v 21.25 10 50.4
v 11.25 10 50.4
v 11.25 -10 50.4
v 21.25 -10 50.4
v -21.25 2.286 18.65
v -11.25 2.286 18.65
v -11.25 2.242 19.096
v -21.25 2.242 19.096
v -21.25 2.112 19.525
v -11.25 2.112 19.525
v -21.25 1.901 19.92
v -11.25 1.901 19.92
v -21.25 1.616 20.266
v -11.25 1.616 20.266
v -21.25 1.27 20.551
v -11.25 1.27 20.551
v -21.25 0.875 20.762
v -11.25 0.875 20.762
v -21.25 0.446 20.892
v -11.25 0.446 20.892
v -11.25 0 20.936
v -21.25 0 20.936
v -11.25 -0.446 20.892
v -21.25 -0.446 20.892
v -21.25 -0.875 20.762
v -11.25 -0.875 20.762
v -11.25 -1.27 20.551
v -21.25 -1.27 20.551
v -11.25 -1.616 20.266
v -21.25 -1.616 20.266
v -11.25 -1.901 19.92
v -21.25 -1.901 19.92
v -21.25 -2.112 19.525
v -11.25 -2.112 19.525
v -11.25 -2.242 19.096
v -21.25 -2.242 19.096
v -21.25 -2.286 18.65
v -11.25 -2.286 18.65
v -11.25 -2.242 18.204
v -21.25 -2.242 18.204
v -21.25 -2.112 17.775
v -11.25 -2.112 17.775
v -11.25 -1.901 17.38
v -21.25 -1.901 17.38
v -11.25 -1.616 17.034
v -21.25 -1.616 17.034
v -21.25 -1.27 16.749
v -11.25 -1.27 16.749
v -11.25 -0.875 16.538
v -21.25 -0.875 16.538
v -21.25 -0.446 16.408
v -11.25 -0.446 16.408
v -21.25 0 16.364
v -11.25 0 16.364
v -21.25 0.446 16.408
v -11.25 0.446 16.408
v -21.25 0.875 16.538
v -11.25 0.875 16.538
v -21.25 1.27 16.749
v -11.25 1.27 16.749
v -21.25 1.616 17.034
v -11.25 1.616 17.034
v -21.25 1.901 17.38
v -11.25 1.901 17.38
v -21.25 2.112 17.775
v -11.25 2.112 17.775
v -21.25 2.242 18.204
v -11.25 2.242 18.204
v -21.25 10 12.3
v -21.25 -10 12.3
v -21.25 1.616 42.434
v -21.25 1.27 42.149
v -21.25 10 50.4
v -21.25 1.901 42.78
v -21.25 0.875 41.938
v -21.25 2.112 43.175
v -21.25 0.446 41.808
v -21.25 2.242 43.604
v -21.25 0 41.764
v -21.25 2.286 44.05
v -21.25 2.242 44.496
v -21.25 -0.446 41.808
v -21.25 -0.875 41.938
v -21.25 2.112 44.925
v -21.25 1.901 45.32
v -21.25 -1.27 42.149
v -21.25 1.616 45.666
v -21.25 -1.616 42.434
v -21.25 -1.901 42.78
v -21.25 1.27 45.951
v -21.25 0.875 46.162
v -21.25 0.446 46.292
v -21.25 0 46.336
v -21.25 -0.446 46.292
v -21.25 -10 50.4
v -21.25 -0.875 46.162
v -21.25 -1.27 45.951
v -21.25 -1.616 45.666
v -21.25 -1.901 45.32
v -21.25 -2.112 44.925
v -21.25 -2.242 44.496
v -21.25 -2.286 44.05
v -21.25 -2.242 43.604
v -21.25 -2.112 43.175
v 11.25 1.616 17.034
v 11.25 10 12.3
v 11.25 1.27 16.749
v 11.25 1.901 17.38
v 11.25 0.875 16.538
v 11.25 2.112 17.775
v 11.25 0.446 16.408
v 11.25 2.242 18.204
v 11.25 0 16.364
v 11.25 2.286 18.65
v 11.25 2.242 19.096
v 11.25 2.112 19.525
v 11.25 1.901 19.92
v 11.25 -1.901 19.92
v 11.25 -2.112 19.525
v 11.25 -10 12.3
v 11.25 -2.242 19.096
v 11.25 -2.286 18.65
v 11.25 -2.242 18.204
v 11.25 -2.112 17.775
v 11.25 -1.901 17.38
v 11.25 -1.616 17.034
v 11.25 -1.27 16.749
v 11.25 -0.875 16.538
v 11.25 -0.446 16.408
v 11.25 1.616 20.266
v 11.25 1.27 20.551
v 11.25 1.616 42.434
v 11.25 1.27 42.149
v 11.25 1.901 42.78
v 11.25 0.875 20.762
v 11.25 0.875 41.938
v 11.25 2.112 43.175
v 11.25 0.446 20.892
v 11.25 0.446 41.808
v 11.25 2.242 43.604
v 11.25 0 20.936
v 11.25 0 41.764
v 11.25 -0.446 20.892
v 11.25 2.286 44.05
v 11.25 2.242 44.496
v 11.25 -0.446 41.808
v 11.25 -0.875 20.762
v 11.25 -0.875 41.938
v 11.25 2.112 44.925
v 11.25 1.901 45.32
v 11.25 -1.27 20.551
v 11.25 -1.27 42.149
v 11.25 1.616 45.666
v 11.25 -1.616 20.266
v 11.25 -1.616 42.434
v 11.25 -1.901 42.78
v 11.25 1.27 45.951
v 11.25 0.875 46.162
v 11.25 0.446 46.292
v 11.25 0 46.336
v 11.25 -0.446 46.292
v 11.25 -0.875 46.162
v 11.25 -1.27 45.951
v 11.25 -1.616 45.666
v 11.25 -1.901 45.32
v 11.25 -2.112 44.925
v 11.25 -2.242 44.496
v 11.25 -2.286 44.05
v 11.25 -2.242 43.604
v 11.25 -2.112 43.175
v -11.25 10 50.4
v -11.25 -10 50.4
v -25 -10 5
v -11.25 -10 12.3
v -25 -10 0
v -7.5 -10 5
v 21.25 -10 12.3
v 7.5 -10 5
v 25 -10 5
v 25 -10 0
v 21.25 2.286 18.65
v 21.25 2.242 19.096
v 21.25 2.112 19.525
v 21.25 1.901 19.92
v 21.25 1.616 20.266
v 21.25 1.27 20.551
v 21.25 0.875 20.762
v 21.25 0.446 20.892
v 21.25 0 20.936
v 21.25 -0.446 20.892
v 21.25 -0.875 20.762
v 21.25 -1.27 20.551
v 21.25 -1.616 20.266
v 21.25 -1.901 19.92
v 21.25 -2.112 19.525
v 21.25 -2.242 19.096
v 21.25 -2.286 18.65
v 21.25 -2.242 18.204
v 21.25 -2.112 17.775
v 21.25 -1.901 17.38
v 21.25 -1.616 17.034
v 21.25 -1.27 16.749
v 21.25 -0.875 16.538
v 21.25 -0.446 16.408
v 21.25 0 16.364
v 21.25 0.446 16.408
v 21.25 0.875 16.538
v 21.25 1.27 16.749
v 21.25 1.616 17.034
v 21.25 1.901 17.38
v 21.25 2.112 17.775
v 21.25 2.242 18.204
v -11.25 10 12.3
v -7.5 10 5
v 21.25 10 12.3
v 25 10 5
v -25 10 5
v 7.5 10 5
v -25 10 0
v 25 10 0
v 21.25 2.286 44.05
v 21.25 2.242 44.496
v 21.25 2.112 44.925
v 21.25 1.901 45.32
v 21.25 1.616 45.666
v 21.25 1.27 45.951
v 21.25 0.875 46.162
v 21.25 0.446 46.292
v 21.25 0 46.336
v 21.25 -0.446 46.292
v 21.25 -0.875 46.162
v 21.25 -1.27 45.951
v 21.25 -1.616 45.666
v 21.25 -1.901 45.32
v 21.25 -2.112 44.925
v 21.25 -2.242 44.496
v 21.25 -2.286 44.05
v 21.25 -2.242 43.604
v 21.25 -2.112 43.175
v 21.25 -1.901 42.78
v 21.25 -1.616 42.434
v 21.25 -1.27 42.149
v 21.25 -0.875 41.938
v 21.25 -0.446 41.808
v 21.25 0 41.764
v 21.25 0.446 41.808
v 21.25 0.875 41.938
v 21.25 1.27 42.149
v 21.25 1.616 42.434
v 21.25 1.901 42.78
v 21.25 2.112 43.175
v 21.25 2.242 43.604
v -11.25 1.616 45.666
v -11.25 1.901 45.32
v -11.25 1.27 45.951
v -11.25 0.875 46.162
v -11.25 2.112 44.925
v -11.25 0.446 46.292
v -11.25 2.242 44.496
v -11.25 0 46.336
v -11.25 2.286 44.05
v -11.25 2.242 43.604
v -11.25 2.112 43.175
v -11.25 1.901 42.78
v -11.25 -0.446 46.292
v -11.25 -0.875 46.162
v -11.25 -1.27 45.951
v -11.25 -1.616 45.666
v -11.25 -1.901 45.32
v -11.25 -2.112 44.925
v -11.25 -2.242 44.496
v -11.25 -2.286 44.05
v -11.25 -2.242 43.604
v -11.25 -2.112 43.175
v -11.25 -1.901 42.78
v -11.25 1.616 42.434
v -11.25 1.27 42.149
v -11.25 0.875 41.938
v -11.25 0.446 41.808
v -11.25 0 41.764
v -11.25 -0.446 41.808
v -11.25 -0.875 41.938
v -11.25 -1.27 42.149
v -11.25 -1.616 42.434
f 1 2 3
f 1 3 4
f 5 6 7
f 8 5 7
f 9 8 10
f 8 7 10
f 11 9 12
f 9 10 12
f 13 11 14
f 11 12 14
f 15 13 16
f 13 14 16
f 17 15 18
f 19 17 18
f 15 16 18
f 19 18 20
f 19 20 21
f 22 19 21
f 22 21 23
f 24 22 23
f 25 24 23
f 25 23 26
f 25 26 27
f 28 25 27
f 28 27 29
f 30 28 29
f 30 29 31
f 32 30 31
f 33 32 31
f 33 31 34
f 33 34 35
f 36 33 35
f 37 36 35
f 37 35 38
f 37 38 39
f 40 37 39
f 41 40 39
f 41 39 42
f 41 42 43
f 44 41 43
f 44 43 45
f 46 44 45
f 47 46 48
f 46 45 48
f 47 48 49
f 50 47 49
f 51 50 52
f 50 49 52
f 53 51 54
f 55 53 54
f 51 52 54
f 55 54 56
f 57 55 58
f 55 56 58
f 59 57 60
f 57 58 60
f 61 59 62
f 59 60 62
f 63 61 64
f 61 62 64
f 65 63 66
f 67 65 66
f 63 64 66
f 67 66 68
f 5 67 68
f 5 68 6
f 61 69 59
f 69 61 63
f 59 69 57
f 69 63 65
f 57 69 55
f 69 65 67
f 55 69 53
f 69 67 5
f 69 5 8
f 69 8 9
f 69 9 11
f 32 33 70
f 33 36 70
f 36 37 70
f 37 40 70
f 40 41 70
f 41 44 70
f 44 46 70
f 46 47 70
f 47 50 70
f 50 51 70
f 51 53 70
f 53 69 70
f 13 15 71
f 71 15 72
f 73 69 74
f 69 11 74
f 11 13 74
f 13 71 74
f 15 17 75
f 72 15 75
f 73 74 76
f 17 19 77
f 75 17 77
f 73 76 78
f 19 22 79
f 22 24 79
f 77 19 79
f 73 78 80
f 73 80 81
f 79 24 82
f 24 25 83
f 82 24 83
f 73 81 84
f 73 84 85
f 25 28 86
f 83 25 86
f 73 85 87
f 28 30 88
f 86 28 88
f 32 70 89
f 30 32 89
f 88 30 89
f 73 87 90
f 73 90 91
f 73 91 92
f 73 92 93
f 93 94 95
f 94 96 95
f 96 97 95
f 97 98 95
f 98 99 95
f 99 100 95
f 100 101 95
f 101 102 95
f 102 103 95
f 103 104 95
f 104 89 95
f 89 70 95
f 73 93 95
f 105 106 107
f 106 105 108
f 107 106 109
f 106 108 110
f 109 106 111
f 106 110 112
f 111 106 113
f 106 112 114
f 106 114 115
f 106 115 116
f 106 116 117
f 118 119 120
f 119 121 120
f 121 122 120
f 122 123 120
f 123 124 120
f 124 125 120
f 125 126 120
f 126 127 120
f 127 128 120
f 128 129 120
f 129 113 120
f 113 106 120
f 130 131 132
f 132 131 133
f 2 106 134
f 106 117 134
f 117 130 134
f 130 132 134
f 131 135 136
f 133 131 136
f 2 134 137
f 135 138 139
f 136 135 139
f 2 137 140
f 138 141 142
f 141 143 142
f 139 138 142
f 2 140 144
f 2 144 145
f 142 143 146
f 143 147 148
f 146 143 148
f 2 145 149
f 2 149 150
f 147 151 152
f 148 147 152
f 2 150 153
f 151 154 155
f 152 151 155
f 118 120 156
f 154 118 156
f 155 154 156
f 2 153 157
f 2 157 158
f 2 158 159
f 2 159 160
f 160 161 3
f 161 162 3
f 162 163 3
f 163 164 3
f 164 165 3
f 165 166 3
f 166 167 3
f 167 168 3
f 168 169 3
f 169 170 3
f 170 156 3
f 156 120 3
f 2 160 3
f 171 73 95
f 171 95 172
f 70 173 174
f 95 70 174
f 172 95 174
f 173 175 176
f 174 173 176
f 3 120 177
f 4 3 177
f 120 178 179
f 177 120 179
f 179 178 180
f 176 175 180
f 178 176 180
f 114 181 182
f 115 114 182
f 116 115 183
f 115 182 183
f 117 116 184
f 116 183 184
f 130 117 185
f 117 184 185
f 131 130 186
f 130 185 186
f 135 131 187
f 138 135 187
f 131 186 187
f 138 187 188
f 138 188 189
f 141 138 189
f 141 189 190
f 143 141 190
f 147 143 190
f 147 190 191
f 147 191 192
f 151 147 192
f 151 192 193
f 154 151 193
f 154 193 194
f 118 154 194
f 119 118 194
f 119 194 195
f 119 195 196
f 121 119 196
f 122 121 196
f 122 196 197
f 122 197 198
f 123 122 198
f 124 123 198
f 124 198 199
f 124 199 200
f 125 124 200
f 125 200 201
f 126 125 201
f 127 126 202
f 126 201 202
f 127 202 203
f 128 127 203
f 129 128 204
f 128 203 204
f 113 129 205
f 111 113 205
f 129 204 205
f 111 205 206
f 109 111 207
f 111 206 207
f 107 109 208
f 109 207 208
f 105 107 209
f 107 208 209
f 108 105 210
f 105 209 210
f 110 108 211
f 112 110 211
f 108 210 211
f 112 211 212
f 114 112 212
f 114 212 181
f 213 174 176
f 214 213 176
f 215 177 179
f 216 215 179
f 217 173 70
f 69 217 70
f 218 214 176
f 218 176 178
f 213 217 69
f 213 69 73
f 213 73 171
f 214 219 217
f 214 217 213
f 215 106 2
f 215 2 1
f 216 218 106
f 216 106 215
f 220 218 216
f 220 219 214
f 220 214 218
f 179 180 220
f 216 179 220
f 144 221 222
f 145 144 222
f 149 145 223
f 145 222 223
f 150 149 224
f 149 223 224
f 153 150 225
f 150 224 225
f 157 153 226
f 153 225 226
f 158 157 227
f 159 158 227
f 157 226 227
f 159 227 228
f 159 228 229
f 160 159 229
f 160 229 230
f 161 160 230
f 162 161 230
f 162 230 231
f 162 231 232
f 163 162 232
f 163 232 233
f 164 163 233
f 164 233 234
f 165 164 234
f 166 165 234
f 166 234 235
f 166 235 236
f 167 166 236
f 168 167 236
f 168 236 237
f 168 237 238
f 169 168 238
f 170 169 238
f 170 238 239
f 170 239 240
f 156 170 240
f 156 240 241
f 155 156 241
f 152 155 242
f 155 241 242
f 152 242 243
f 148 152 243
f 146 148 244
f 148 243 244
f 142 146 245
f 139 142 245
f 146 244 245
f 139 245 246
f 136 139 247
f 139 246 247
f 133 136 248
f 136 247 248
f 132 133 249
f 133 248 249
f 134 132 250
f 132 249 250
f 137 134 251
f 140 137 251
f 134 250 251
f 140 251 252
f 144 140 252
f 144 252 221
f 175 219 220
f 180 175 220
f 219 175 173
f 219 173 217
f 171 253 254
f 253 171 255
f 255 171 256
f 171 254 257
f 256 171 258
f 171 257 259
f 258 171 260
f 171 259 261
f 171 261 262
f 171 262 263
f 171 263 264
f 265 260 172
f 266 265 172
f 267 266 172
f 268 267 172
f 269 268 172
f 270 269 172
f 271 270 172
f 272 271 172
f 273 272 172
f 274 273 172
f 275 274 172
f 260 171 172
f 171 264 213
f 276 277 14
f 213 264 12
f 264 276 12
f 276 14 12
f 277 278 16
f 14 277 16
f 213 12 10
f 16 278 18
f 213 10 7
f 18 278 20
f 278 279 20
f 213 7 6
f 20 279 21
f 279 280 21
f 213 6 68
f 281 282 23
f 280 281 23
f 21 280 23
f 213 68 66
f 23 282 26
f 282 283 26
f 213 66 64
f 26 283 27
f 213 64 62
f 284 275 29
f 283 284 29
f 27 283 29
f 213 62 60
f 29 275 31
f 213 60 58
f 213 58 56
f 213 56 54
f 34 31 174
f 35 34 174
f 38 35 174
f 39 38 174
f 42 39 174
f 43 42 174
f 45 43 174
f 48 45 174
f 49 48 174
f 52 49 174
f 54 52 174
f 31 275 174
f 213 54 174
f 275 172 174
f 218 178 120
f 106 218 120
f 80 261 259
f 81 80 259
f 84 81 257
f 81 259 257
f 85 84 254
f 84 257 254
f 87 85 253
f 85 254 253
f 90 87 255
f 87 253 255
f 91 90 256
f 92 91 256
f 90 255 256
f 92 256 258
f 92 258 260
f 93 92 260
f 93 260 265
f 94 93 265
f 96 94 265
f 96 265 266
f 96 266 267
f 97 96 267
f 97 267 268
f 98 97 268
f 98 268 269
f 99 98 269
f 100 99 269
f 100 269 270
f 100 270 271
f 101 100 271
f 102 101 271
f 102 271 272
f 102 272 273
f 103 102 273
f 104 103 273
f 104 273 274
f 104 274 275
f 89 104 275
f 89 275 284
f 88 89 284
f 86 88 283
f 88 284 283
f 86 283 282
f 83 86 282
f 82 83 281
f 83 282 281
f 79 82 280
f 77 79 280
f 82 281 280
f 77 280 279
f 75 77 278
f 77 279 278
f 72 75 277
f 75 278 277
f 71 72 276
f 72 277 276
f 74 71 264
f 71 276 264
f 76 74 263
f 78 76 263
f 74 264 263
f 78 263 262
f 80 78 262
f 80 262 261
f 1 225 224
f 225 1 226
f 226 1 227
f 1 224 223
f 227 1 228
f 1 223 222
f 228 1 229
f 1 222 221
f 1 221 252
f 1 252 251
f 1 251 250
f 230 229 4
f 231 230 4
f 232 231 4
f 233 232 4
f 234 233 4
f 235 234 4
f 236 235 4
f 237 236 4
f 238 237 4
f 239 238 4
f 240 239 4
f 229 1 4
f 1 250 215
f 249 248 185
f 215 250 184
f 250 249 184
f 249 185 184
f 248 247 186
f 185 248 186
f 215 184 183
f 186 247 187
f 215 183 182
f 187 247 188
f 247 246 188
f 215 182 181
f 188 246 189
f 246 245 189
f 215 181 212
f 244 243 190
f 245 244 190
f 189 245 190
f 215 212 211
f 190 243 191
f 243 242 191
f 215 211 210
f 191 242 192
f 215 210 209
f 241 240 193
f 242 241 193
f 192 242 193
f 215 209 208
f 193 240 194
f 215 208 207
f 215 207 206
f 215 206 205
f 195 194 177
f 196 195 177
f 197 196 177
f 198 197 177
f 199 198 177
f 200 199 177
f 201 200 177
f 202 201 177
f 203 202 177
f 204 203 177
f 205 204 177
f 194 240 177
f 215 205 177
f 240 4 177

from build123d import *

# Parameters (mm, degrees)
F0_W      = 50
F0_H      = 20
F1_DEPTH  = 5
F2_W      = 17.5
F2_H      = 20
F3_DEPTH  = 20
F3_FACE_W = 17.5
F3_FACE_H = 20
F4_DEPTH  = 25.4
F5_R      = 2.286
F6_DEPTH  = 50.001
F8_DEPTH  = 20.001


with BuildPart() as f1:
    # F0 (on Top) → F1 (new body)
    with BuildSketch(Plane.XY):
        Rectangle(F0_W, F0_H)
    extrude(amount=F1_DEPTH)

    # F2 (on face) → F3 (join)
    with BuildSketch(Plane.XY.offset(5)):
        with Locations((16.25, 0)):
            Rectangle(F2_W, F2_H)
        with Locations((-16.25, 0)):
            Rectangle(F2_W, F2_H)
    extrude(amount=F3_DEPTH)

    # F3_face (on face) → F4 (join)
    with BuildSketch(Plane(origin=(16.25, 0, 25), x_dir=(1, 0, 0), z_dir=(0, 0, 1))):
        Rectangle(F3_FACE_W, F3_FACE_H)
        with Locations((-32.5, 0)):
            Rectangle(F3_FACE_W, F3_FACE_H)
    extrude(amount=F4_DEPTH)

    # F5 (on face) → F6 (cut, through all)
    with BuildSketch(Plane.YZ.offset(25)):
        with Locations((0, 44.05)):
            Circle(F5_R)
        with Locations((0, 18.65)):
            Circle(F5_R)
    extrude(amount=-F6_DEPTH, mode=Mode.SUBTRACT)

    # F7 (on face) → F8 (cut, through all)
    with BuildSketch(Plane.XZ.offset(10)):
        Polygon((-25, 50.4), (-25, 5), (-21.25, 12.3), (-21.25, 50.4), align=None)
        Polygon((-11.25, 12.3), (-7.5, 5), (-7.5, 50.4), (-11.25, 50.4), align=None)
        Polygon((7.5, 50.4), (7.5, 5), (11.25, 12.3), (11.25, 50.4), align=None)
        Polygon((21.25, 12.3), (25, 5), (25, 50.4), (21.25, 50.4), align=None)
    extrude(amount=-F8_DEPTH, mode=Mode.SUBTRACT)


solid = f1.part
